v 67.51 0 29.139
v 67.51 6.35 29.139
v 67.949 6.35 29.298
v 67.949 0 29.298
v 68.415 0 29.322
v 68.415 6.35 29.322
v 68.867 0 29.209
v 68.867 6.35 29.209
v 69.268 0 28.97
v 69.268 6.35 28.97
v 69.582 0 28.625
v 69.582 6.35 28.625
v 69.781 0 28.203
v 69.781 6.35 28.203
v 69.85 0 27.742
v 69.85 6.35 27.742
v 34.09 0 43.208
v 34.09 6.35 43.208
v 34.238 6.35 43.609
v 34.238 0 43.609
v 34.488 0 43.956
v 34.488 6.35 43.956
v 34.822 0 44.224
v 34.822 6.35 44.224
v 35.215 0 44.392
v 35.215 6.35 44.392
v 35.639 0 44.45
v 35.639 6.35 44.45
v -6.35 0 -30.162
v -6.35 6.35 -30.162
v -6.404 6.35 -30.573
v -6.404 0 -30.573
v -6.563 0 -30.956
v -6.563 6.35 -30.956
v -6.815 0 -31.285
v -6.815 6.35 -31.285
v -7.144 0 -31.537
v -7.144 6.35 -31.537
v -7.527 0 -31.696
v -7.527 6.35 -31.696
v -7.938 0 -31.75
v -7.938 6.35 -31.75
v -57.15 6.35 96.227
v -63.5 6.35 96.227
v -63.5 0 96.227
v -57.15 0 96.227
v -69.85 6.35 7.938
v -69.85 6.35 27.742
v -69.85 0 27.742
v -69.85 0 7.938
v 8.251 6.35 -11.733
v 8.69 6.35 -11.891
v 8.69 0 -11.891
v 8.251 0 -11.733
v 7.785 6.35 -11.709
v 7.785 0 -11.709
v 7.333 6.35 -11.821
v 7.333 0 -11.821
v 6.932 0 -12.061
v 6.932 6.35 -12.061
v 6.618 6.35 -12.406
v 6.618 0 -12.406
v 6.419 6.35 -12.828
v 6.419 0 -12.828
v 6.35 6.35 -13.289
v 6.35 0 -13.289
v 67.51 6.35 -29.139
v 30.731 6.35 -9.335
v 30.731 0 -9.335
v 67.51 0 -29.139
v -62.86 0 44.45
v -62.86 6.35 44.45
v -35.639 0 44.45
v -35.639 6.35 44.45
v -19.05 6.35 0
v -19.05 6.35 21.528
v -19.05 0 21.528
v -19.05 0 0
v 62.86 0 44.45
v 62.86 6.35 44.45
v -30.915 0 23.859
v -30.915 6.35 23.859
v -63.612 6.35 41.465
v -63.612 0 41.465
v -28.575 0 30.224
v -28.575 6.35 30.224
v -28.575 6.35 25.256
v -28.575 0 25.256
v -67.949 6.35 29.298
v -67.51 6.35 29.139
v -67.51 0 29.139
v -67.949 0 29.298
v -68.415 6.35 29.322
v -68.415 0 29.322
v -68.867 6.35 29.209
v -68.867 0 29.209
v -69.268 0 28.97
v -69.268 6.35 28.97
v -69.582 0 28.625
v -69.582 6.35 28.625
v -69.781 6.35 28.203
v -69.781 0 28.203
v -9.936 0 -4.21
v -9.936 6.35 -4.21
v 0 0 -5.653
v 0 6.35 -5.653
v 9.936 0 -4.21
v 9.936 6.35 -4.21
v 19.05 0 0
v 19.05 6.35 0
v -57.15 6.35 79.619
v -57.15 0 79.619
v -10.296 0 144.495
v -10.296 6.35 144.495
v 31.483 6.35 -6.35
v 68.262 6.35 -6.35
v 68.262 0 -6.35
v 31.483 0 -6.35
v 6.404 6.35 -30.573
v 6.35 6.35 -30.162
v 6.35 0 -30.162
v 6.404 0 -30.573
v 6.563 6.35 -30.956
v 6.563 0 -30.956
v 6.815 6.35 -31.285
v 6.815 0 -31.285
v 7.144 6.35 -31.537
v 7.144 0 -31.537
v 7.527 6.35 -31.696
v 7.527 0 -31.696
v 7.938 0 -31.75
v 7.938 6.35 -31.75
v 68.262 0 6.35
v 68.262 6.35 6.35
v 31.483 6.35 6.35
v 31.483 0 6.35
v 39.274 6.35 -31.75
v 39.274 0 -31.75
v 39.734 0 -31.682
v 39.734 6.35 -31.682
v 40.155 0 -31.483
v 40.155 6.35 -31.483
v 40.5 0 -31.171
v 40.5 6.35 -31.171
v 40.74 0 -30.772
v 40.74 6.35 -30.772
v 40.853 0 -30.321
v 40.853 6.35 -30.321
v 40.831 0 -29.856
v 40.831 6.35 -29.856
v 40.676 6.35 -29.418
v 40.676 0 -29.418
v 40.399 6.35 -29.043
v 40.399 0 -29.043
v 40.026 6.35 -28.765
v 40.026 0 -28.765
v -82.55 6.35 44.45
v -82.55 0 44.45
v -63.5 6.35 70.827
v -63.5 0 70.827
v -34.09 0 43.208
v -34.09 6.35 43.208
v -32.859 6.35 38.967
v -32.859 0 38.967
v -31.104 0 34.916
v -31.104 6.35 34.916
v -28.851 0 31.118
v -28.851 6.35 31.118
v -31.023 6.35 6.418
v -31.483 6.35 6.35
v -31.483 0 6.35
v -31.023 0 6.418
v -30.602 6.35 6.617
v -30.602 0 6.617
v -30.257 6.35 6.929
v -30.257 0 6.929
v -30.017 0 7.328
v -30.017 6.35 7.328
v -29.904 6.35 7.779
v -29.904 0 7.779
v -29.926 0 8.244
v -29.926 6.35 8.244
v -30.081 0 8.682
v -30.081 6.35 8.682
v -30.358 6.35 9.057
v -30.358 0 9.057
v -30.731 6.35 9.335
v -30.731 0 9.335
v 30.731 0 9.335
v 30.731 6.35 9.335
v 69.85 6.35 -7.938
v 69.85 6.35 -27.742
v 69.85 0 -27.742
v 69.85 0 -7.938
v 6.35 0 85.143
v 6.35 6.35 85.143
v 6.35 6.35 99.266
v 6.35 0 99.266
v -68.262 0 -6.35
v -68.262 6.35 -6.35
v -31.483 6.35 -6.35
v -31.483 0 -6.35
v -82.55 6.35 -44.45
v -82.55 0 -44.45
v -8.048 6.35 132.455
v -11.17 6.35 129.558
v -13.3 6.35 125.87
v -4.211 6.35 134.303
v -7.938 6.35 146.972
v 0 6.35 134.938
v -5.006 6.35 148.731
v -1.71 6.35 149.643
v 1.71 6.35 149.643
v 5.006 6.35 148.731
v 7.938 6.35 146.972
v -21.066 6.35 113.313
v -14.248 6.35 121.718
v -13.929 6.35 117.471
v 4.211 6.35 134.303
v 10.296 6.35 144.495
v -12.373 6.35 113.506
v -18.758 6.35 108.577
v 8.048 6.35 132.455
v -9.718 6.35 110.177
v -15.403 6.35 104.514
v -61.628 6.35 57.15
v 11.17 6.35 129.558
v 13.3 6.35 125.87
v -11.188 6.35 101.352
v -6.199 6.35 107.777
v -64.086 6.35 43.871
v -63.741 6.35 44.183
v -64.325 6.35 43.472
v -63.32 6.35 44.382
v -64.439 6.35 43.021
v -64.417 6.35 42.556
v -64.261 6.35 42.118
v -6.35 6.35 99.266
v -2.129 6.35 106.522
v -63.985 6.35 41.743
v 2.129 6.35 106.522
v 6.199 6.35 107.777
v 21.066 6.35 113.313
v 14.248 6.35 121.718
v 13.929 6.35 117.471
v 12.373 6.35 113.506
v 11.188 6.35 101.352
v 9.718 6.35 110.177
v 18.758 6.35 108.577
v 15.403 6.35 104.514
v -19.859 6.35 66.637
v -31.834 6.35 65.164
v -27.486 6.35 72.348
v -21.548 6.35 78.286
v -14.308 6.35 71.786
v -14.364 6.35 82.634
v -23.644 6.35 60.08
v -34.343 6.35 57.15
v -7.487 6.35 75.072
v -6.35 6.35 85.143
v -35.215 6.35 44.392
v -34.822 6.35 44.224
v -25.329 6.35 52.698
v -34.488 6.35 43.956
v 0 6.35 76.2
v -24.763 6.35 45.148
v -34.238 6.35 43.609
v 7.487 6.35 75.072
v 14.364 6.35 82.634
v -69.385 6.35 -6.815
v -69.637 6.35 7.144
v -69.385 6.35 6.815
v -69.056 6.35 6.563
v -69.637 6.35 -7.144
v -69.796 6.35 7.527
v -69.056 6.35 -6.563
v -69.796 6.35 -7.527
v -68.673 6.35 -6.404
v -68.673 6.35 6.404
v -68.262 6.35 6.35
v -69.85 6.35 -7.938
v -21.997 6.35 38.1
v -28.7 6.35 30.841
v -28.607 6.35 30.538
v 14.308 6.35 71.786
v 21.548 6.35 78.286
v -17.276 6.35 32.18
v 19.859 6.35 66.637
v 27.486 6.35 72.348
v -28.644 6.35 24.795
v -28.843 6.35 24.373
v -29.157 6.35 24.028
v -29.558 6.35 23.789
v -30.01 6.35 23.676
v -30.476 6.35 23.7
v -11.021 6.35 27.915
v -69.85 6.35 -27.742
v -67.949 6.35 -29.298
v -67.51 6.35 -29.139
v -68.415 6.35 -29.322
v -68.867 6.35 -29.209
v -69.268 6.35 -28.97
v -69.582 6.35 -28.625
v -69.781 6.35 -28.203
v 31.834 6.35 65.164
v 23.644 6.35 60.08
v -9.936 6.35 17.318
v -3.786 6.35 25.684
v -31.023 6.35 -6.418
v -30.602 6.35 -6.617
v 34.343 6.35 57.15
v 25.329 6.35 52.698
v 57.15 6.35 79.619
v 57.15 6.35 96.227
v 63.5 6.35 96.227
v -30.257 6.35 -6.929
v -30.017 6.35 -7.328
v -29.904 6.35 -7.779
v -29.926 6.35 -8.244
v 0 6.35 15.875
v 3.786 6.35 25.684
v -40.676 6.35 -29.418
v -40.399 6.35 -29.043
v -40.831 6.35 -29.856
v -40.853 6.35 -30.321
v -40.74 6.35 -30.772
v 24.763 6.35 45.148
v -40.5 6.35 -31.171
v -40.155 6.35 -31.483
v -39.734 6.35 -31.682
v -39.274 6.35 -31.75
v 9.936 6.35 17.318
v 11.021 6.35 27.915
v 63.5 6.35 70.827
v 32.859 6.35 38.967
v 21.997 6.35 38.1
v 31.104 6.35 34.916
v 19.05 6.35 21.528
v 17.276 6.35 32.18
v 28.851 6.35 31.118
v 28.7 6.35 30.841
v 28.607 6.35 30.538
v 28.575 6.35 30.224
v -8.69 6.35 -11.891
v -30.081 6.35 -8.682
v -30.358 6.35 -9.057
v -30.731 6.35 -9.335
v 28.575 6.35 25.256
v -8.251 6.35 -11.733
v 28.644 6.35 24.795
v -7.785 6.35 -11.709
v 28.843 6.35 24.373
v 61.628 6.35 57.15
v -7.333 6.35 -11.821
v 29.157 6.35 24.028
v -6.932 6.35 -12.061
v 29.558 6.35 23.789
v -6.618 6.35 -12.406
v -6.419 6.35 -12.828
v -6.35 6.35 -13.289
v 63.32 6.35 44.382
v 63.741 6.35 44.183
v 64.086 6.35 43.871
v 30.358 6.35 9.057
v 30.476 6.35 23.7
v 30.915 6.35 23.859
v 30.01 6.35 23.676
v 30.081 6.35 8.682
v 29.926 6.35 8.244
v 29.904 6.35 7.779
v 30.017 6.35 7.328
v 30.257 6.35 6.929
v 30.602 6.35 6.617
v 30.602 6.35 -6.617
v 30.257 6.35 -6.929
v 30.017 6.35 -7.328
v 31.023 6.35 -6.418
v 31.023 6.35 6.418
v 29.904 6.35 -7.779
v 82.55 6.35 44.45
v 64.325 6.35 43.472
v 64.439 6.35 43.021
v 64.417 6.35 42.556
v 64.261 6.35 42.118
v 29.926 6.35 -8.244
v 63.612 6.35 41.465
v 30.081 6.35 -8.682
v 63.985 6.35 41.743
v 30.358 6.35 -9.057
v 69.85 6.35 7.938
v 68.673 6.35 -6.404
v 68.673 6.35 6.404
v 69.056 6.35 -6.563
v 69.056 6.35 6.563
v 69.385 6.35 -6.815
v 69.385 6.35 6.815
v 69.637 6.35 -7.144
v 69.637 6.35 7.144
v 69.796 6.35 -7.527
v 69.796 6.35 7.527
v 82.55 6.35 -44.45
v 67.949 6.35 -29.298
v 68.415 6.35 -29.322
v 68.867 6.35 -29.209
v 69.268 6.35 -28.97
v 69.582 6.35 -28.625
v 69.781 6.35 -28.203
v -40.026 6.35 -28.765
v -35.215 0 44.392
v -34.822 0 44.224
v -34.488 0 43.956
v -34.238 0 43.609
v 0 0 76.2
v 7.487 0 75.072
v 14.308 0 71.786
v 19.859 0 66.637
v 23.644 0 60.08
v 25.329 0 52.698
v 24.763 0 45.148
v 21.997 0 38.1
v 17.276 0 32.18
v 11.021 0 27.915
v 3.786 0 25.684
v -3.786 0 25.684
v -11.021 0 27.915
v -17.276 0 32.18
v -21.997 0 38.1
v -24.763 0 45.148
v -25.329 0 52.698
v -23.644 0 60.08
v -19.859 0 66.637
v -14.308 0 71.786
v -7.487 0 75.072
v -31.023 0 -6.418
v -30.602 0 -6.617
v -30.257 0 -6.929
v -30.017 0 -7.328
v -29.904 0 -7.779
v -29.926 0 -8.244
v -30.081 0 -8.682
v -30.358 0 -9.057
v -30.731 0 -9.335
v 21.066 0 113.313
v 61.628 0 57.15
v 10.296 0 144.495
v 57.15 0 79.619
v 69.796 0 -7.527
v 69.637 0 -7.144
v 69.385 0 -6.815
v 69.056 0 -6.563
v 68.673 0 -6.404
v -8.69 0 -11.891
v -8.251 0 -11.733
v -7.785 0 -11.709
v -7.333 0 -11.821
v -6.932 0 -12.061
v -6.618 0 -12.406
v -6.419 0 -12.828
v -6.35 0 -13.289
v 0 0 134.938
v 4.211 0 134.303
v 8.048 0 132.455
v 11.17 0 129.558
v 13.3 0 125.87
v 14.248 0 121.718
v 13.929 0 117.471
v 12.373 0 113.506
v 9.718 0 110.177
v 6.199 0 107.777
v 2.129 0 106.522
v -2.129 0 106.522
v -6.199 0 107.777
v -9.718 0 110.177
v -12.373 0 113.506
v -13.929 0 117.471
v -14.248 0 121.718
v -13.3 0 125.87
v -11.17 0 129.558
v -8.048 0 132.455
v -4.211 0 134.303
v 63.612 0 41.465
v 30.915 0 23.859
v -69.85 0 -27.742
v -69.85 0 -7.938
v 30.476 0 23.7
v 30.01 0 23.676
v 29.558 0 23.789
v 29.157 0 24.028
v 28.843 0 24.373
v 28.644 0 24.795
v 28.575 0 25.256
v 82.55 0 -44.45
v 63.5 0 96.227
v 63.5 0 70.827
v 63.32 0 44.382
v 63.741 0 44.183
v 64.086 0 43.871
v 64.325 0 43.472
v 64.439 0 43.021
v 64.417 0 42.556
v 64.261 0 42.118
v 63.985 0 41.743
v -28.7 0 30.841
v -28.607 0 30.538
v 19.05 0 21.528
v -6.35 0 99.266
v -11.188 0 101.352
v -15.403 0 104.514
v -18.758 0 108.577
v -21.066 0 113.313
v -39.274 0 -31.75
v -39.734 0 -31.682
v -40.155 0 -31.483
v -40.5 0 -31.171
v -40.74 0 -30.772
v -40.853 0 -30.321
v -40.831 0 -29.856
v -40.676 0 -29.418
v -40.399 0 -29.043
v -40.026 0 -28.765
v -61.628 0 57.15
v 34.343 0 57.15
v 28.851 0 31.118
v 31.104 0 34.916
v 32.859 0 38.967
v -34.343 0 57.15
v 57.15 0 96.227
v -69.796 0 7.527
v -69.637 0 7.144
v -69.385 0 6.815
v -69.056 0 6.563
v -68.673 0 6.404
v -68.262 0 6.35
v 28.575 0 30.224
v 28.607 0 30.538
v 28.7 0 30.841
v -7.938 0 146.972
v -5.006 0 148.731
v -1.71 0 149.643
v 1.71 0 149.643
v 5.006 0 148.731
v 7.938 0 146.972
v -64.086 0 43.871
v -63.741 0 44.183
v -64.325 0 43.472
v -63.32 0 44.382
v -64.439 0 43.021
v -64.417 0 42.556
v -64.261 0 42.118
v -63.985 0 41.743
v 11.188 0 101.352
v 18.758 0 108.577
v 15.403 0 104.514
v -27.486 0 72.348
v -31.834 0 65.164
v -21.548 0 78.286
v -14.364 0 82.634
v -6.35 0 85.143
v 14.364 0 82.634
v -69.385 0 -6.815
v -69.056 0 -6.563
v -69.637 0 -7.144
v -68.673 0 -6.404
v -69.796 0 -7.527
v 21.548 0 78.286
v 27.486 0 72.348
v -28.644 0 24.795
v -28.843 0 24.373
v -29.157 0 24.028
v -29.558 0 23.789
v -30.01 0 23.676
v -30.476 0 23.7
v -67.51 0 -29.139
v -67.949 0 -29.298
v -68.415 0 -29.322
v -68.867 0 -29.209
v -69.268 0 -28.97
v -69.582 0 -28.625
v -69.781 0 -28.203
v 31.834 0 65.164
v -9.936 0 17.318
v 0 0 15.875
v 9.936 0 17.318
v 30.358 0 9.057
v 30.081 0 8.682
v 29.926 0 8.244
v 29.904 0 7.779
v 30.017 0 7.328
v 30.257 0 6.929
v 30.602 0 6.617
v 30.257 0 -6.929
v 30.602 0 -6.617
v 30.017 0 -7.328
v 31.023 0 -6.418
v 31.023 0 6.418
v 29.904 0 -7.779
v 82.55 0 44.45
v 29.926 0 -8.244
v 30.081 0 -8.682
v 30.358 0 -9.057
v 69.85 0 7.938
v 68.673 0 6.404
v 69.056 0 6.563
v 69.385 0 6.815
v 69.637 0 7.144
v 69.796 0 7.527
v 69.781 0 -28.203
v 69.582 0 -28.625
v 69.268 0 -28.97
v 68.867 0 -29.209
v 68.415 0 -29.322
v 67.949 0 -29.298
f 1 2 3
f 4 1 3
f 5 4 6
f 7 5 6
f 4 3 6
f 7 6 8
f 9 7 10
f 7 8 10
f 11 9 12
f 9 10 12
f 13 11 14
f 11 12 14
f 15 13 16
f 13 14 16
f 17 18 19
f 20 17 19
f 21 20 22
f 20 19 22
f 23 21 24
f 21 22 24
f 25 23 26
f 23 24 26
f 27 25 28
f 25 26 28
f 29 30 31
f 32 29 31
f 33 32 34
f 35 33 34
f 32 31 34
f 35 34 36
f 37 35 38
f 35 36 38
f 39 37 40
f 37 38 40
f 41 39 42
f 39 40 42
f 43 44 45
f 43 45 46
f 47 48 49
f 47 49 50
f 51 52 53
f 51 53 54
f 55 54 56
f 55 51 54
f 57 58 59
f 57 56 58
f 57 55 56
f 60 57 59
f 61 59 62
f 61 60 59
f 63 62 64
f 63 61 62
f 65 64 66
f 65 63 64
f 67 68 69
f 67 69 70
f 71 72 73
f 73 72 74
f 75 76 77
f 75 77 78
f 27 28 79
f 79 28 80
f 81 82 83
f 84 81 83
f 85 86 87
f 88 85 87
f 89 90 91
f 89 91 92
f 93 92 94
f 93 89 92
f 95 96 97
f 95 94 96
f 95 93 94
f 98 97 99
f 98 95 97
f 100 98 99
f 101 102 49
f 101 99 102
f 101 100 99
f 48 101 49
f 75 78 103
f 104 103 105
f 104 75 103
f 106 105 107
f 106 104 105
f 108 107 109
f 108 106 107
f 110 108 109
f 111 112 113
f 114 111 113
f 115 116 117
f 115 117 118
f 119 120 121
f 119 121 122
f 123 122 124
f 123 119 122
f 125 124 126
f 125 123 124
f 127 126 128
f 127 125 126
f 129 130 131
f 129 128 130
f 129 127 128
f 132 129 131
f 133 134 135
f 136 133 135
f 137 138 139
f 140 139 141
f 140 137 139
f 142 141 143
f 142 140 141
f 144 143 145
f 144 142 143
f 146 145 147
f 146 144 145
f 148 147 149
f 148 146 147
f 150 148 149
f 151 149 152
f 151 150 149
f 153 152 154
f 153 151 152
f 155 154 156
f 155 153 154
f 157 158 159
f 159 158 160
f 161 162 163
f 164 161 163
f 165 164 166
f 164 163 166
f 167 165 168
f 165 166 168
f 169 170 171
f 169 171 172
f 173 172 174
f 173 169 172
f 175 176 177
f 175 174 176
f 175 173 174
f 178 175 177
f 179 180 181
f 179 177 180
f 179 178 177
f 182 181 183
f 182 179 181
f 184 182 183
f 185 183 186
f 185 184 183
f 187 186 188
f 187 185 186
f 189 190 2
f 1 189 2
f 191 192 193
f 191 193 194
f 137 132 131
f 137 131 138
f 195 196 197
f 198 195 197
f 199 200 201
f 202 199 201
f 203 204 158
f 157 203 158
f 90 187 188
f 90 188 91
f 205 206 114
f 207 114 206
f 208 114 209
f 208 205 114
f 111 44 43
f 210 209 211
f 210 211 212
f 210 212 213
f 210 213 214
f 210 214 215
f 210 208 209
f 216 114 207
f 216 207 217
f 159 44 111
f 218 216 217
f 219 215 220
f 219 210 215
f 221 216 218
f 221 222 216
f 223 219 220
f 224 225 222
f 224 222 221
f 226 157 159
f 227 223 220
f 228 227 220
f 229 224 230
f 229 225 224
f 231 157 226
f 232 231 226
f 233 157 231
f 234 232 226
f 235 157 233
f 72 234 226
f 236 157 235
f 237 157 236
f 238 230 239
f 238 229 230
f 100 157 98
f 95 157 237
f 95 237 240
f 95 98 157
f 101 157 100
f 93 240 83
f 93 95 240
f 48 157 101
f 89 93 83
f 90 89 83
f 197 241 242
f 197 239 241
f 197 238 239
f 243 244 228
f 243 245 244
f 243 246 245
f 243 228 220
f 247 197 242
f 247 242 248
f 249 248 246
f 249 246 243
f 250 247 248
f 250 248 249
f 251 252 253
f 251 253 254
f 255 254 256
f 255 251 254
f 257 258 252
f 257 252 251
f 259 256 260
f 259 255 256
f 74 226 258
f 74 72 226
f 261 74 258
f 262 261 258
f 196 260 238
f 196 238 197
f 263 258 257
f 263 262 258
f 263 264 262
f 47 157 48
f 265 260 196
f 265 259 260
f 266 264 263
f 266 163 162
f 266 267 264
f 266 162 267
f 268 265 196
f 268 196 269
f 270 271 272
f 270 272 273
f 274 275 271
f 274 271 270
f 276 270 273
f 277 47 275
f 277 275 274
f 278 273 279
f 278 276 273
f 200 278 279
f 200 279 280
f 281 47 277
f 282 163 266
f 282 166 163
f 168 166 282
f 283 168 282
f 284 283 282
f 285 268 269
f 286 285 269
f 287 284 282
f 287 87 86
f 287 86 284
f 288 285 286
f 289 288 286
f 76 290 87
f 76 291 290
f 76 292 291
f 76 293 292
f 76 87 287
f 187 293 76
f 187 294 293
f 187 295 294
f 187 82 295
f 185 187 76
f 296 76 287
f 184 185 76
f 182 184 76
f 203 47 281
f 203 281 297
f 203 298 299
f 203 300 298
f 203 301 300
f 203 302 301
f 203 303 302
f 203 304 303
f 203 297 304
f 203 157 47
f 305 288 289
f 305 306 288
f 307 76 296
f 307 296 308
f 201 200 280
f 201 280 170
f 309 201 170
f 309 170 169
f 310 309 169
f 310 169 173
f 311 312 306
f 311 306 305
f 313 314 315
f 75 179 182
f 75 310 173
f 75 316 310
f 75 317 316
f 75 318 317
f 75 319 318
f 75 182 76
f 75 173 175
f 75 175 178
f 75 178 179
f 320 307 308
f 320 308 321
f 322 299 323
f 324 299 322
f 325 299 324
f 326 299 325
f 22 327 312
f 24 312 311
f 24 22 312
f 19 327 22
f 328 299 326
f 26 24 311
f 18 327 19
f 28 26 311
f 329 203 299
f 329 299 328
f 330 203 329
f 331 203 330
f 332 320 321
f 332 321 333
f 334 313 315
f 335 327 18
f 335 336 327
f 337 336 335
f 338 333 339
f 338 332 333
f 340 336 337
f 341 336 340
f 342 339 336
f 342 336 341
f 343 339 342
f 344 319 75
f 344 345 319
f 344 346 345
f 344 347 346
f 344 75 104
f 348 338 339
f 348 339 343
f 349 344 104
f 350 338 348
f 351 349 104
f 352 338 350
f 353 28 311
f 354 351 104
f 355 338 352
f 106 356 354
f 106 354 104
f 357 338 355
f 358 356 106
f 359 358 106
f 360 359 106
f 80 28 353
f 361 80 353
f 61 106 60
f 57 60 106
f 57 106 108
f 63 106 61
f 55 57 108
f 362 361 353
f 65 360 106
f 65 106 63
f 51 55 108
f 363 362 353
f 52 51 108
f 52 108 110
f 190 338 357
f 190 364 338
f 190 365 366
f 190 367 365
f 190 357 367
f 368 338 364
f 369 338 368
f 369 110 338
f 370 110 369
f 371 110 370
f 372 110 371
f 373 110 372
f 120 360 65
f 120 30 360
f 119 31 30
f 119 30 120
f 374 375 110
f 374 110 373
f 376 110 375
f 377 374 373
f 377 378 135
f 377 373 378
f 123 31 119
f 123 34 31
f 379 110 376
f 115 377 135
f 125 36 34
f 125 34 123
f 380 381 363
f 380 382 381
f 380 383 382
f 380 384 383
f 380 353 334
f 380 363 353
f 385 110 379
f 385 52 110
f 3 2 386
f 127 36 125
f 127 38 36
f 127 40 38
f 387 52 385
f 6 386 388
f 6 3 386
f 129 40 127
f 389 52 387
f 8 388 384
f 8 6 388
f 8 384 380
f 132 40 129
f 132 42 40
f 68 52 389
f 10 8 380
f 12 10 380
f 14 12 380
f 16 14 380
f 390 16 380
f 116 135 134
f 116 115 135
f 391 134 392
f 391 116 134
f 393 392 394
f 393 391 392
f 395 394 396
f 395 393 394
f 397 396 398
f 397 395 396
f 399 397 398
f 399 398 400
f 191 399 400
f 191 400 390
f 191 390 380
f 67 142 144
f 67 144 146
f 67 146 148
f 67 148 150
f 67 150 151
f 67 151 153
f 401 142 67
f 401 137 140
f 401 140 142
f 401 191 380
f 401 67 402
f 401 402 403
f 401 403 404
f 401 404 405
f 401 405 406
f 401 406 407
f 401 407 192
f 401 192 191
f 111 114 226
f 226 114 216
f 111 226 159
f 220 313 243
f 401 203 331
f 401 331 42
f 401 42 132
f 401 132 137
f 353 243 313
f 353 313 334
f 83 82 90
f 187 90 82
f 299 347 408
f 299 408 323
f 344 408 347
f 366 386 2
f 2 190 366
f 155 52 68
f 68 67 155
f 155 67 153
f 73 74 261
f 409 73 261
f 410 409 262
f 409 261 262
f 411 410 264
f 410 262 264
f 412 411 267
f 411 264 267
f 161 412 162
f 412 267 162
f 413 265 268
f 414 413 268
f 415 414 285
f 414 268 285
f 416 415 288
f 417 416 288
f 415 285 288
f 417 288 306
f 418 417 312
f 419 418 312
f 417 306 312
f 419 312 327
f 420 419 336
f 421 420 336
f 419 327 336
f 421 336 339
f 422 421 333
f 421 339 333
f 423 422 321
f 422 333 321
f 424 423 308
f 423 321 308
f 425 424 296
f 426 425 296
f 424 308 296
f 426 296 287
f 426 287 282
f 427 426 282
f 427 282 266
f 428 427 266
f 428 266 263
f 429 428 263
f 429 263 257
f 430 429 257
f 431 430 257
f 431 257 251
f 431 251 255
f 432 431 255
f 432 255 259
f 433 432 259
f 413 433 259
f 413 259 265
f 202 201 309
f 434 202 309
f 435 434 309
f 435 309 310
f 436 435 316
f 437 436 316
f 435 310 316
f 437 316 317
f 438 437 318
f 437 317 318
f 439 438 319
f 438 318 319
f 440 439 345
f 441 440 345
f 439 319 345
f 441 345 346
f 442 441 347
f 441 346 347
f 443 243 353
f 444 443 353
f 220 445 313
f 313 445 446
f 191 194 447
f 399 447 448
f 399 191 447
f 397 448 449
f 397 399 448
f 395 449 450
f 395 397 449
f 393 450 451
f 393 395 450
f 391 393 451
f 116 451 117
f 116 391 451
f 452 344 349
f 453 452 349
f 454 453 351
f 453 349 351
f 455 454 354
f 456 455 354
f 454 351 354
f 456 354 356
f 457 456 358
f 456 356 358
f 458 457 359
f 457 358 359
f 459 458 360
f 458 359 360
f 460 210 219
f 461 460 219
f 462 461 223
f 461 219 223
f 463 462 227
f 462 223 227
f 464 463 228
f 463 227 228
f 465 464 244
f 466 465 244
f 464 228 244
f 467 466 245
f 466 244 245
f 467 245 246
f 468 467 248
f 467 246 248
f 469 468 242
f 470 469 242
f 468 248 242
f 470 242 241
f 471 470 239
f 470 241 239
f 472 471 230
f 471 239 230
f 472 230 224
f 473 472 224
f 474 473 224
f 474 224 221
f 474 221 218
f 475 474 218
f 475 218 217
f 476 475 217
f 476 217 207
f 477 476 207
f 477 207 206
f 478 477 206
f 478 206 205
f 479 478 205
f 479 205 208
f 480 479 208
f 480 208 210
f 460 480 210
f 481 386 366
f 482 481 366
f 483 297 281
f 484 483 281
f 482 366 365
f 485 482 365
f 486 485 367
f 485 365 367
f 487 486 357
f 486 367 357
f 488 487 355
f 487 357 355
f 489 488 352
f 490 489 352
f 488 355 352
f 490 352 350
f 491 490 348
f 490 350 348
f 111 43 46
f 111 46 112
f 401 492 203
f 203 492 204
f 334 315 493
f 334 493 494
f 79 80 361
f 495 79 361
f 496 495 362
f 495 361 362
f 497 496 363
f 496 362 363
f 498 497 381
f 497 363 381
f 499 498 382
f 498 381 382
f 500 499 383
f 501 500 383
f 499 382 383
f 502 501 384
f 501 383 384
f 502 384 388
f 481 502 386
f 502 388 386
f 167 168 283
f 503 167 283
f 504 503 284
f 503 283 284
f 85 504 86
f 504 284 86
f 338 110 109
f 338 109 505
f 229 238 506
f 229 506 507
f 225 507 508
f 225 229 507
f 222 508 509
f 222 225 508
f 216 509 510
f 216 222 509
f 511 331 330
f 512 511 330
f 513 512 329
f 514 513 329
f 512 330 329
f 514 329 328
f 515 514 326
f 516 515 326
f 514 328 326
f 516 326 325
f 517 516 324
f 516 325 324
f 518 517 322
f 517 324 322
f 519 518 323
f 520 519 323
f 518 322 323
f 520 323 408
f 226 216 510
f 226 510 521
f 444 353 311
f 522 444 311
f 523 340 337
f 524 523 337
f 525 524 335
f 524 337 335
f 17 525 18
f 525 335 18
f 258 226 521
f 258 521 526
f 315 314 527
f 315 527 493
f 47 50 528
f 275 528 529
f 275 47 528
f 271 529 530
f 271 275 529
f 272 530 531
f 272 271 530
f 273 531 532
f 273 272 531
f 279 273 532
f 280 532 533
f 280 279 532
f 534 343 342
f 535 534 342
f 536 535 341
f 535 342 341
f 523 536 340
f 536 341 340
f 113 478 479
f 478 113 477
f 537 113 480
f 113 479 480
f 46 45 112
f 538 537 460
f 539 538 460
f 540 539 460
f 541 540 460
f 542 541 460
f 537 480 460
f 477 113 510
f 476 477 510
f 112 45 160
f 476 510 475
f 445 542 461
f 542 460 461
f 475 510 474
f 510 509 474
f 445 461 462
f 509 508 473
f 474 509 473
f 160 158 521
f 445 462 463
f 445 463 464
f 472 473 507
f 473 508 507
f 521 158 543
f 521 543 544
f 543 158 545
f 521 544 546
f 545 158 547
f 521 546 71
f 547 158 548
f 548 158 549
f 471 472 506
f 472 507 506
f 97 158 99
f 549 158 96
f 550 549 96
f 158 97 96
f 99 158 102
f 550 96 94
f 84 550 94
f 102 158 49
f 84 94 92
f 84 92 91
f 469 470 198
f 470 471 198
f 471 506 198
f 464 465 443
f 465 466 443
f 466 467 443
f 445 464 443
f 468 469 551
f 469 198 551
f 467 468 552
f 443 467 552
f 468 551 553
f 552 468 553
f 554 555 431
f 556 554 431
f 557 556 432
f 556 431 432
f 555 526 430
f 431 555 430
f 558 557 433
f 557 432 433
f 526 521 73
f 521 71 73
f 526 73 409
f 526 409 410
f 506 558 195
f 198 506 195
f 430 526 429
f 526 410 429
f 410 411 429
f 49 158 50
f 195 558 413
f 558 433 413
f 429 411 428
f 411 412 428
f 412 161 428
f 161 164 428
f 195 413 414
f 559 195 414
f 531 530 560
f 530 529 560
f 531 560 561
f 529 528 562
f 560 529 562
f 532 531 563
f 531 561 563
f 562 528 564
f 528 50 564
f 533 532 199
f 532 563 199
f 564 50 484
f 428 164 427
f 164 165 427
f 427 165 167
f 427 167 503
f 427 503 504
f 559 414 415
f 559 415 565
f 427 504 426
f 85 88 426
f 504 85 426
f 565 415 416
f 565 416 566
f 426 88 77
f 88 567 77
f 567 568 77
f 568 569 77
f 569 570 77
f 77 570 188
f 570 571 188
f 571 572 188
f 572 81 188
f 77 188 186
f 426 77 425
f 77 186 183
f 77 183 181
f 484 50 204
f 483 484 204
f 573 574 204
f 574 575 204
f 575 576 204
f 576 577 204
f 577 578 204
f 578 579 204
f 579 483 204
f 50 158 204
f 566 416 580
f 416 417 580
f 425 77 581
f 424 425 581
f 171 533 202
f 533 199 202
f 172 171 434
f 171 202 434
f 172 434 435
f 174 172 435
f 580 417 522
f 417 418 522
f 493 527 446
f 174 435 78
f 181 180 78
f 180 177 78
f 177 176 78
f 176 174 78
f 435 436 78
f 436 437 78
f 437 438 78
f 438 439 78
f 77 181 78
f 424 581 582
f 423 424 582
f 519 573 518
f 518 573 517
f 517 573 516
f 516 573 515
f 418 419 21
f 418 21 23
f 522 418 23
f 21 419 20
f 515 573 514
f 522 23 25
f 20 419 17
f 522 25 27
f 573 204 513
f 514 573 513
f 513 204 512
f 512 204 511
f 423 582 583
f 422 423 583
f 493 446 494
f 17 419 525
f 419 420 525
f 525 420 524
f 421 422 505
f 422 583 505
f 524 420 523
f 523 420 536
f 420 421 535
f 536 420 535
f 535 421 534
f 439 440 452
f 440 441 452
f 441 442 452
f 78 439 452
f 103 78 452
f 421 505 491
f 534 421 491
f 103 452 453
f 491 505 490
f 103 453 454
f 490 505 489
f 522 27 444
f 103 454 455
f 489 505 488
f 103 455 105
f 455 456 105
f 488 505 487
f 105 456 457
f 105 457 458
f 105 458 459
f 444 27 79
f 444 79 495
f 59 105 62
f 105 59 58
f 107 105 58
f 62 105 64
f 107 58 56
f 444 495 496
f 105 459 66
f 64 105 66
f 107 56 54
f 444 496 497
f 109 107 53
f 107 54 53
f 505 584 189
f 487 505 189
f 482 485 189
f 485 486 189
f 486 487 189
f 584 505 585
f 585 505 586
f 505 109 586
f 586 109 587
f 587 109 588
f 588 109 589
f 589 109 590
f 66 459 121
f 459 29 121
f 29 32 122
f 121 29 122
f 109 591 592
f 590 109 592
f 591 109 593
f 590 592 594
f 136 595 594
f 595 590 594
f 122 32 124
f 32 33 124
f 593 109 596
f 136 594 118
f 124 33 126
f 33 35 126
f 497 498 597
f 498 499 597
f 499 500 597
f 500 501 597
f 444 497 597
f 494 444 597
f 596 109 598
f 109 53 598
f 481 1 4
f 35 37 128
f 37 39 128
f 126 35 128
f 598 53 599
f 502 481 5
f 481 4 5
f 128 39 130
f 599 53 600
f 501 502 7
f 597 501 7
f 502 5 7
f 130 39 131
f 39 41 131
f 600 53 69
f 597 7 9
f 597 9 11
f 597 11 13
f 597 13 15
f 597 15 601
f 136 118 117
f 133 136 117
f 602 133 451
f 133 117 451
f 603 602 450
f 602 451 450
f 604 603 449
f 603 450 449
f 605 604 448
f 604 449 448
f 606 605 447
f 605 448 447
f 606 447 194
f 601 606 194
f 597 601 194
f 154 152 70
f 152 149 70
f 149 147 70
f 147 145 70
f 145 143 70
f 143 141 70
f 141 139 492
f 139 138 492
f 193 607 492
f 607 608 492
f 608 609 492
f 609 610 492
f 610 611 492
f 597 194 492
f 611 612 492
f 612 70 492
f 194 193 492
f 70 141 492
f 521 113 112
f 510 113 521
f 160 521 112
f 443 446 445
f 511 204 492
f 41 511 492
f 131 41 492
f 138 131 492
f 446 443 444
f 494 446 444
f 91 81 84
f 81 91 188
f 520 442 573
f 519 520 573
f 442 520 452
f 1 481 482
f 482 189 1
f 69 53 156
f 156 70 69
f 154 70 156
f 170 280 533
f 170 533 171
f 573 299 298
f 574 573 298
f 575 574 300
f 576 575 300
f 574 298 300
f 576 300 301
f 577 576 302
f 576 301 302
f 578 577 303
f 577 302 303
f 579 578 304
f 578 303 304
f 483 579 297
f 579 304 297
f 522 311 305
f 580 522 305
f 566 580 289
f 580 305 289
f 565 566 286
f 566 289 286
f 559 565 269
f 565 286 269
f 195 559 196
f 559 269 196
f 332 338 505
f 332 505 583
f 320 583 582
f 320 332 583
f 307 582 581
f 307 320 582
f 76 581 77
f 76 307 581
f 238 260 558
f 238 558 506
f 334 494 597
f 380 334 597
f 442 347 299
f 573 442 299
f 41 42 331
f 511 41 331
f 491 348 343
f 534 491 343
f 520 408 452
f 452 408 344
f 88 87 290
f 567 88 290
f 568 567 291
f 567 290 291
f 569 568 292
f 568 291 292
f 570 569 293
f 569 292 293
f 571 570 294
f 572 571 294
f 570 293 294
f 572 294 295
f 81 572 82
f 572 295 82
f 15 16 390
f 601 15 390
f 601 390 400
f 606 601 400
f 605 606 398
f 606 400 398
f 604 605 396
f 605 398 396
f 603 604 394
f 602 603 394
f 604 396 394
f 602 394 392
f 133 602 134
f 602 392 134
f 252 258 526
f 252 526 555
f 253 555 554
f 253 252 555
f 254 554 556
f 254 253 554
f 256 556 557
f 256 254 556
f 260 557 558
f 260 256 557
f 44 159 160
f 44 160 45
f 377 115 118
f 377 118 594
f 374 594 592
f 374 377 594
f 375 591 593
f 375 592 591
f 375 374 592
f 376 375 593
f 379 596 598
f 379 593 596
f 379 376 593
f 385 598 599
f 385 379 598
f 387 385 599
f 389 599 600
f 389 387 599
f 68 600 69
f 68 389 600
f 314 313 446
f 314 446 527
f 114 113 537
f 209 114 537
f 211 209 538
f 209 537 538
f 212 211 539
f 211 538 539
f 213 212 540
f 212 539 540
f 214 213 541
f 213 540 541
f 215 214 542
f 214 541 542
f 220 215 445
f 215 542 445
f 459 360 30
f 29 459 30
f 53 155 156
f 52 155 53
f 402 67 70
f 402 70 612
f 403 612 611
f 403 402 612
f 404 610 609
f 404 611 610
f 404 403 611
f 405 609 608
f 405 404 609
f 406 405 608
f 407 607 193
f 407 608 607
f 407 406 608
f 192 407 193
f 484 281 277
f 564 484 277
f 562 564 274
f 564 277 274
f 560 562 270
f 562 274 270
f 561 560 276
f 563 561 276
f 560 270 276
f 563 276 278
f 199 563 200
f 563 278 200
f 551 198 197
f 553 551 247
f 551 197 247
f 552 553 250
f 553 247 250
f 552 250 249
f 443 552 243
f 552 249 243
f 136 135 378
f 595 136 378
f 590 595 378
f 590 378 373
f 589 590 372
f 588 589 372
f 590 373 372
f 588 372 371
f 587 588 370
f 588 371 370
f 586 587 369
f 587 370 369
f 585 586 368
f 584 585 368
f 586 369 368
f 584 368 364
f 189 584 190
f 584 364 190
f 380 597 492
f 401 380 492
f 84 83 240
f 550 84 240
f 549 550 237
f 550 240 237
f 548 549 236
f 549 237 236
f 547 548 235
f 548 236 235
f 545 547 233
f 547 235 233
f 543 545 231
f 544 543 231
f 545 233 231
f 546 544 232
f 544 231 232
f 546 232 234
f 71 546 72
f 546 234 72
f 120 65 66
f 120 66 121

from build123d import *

# Parameters (mm, degrees)
BOSS_EXTRUDE1_DEPTH = 6.35
BOSS_EXTRUDE2_DEPTH = 6.35
CUT_EXTRUDE2_REACH  = 173.121
SKETCH3_R           = 25.4
SKETCH3_R_2         = 14.2875


with BuildPart() as part:
    # Sketch1 → Boss-Extrude1 (new body)
    with BuildSketch(Plane(origin=(0, 0, 0), x_dir=(1, 0, 0), z_dir=(0, 1, 0))):
        with BuildLine():
            Line((-82.55, -44.45), (-10.295626201, -144.494517568))
            ThreePointArc((-10.295626201, -144.494517568), (0, -149.758787534), (10.295626201, -144.494517568))
            Line((10.295626201, -144.494517568), (82.55, -44.45))
            Line((82.55, -44.45), (82.55, 44.45))
            Line((82.55, 44.45), (-82.55, 44.45))
            Line((-82.55, 44.45), (-82.55, -44.45))
        make_face()
    extrude(amount=BOSS_EXTRUDE1_DEPTH)

    # Sketch4 → Boss-Extrude2 (add)
    with BuildSketch(Plane(origin=(0, 6.35, 0), x_dir=(1, 0, 0), z_dir=(0, 1, 0))):
        Polygon((-63.5, -70.826923077), (-63.5, -96.226923077), (-57.15, -96.226923077), (-57.15, -79.619230769), align=None)
        Polygon((57.15, -96.226923077), (63.5, -96.226923077), (63.5, -70.826923077), (57.15, -79.619230769), align=None)
    extrude(amount=-BOSS_EXTRUDE2_DEPTH)

    # Sketch3 → Cut-Extrude2 (cut, up to next)
    with BuildSketch(Plane(origin=(0, 6.35, 0), x_dir=(1, 0, 0), z_dir=(0, 1, 0)), mode=Mode.PRIVATE) as cut_extrude2_sk1:
        with Locations(Location((0, -50.8, 0), (0, 0, 270))):
            Circle(SKETCH3_R)
    cut_extrude2_tool1 = extrude(cut_extrude2_sk1.sketch, amount=-CUT_EXTRUDE2_REACH, mode=Mode.PRIVATE) & part.part
    # Sketch3 → Cut-Extrude2 (cut, up to next)
    with BuildSketch(Plane(origin=(0, 6.35, 0), x_dir=(1, 0, 0), z_dir=(0, 1, 0)), mode=Mode.PRIVATE) as cut_extrude2_sk2:
        with Locations(Location((0, -120.65, 0), (0, 0, 270))):
            Circle(SKETCH3_R_2)
    cut_extrude2_tool2 = extrude(cut_extrude2_sk2.sketch, amount=-CUT_EXTRUDE2_REACH, mode=Mode.PRIVATE) & part.part
    # Sketch3 → Cut-Extrude2 (cut, up to next)
    with BuildSketch(Plane(origin=(0, 6.35, 0), x_dir=(1, 0, 0), z_dir=(0, 1, 0)), mode=Mode.PRIVATE) as cut_extrude2_sk3:
        with BuildLine():
            Line((-40.026450178, 28.764752129), (-8.690133469, 11.891350824))
            ThreePointArc((-8.690133469, 11.891350824), (-7.123451286, 11.92620437), (-6.35, 13.289098695))
            Line((-6.35, 13.289098695), (-6.35, 30.1625))
            ThreePointArc((-6.35, 30.1625), (-6.814967985, 31.285032015), (-7.9375, 31.75))
            Line((-7.9375, 31.75), (-39.273816708, 31.75))
            ThreePointArc((-39.273816708, 31.75), (-40.813147894, 30.550592453), (-40.026450178, 28.764752129))
        make_face()
    cut_extrude2_tool3 = extrude(cut_extrude2_sk3.sketch, amount=-CUT_EXTRUDE2_REACH, mode=Mode.PRIVATE) & part.part
    # Sketch3 → Cut-Extrude2 (cut, up to next)
    with BuildSketch(Plane(origin=(0, 6.35, 0), x_dir=(1, 0, 0), z_dir=(0, 1, 0)), mode=Mode.PRIVATE) as cut_extrude2_sk4:
        with BuildLine():
            Line((-69.85, 27.741670535), (-69.85, 7.9375))
            ThreePointArc((-69.85, 7.9375), (-69.385032015, 6.814967985), (-68.2625, 6.35))
            Line((-68.2625, 6.35), (-31.483326149, 6.35))
            ThreePointArc((-31.483326149, 6.35), (-29.943994963, 7.549407547), (-30.73069268, 9.335247871))
            Line((-30.73069268, 9.335247871), (-67.509866531, 29.139418406))
            ThreePointArc((-67.509866531, 29.139418406), (-69.076548714, 29.10456486), (-69.85, 27.741670535))
        make_face()
    cut_extrude2_tool4 = extrude(cut_extrude2_sk4.sketch, amount=-CUT_EXTRUDE2_REACH, mode=Mode.PRIVATE) & part.part
    # Sketch3 → Cut-Extrude2 (cut, up to next)
    with BuildSketch(Plane(origin=(0, 6.35, 0), x_dir=(1, 0, 0), z_dir=(0, 1, 0)), mode=Mode.PRIVATE) as cut_extrude2_sk5:
        with BuildLine():
            Line((7.9375, 31.75), (39.273816708, 31.75))
            ThreePointArc((39.273816708, 31.75), (40.813147894, 30.550592453), (40.026450178, 28.764752129))
            Line((40.026450178, 28.764752129), (8.690133469, 11.891350824))
            ThreePointArc((8.690133469, 11.891350824), (7.123451286, 11.92620437), (6.35, 13.289098695))
            Line((6.35, 13.289098695), (6.35, 30.1625))
            ThreePointArc((6.35, 30.1625), (6.814967985, 31.285032015), (7.9375, 31.75))
        make_face()
    cut_extrude2_tool5 = extrude(cut_extrude2_sk5.sketch, amount=-CUT_EXTRUDE2_REACH, mode=Mode.PRIVATE) & part.part
    # Sketch3 → Cut-Extrude2 (cut, up to next)
    with BuildSketch(Plane(origin=(0, 6.35, 0), x_dir=(1, 0, 0), z_dir=(0, 1, 0)), mode=Mode.PRIVATE) as cut_extrude2_sk6:
        with BuildLine():
            Line((30.73069268, 9.335247871), (67.509866531, 29.139418406))
            ThreePointArc((67.509866531, 29.139418406), (69.076548714, 29.10456486), (69.85, 27.741670535))
            Line((69.85, 27.741670535), (69.85, 7.9375))
            ThreePointArc((69.85, 7.9375), (69.385032015, 6.814967985), (68.2625, 6.35))
            Line((68.2625, 6.35), (31.483326149, 6.35))
            ThreePointArc((31.483326149, 6.35), (29.943994963, 7.549407547), (30.73069268, 9.335247871))
        make_face()
    cut_extrude2_tool6 = extrude(cut_extrude2_sk6.sketch, amount=-CUT_EXTRUDE2_REACH, mode=Mode.PRIVATE) & part.part
    # Sketch3 → Cut-Extrude2 (cut, up to next)
    with BuildSketch(Plane(origin=(0, 6.35, 0), x_dir=(1, 0, 0), z_dir=(0, 1, 0)), mode=Mode.PRIVATE) as cut_extrude2_sk7:
        with BuildLine():
            Line((69.85, -27.741670535), (69.85, -7.9375))
            ThreePointArc((69.85, -7.9375), (69.385032015, -6.814967985), (68.2625, -6.35))
            Line((68.2625, -6.35), (31.483326149, -6.35))
            ThreePointArc((31.483326149, -6.35), (29.943994963, -7.549407547), (30.73069268, -9.335247871))
            Line((30.73069268, -9.335247871), (67.509866531, -29.139418406))
            ThreePointArc((67.509866531, -29.139418406), (69.076548714, -29.10456486), (69.85, -27.741670535))
        make_face()
    cut_extrude2_tool7 = extrude(cut_extrude2_sk7.sketch, amount=-CUT_EXTRUDE2_REACH, mode=Mode.PRIVATE) & part.part
    # Sketch3 → Cut-Extrude2 (cut, up to next)
    with BuildSketch(Plane(origin=(0, 6.35, 0), x_dir=(1, 0, 0), z_dir=(0, 1, 0)), mode=Mode.PRIVATE) as cut_extrude2_sk8:
        with BuildLine():
            Line((-30.73069268, -9.335247871), (-67.509866531, -29.139418406))
            ThreePointArc((-67.509866531, -29.139418406), (-69.076548714, -29.10456486), (-69.85, -27.741670535))
            Line((-69.85, -27.741670535), (-69.85, -7.9375))
            ThreePointArc((-69.85, -7.9375), (-69.385032015, -6.814967985), (-68.2625, -6.35))
            Line((-68.2625, -6.35), (-31.483326149, -6.35))
            ThreePointArc((-31.483326149, -6.35), (-29.943994963, -7.549407547), (-30.73069268, -9.335247871))
        make_face()
    cut_extrude2_tool8 = extrude(cut_extrude2_sk8.sketch, amount=-CUT_EXTRUDE2_REACH, mode=Mode.PRIVATE) & part.part
    # Sketch3 → Cut-Extrude2 (cut, up to next)
    with BuildSketch(Plane(origin=(0, 6.35, 0), x_dir=(1, 0, 0), z_dir=(0, 1, 0)), mode=Mode.PRIVATE) as cut_extrude2_sk9:
        with BuildLine():
            Line((-6.35, -85.142875899), (-6.35, -99.265701316))
            ThreePointArc((-6.35, -99.265701316), (-15.402705776, -104.514096399), (-21.066111407, -113.313128703))
            Line((-21.066111407, -113.313128703), (-61.628371026, -57.15))
            Line((-61.628371026, -57.15), (-34.342875899, -57.15))
            ThreePointArc((-34.342875899, -57.15), (-24.695704333, -75.495704333), (-6.35, -85.142875899))
        make_face()
    cut_extrude2_tool9 = extrude(cut_extrude2_sk9.sketch, amount=-CUT_EXTRUDE2_REACH, mode=Mode.PRIVATE) & part.part
    # Sketch3 → Cut-Extrude2 (cut, up to next)
    with BuildSketch(Plane(origin=(0, 6.35, 0), x_dir=(1, 0, 0), z_dir=(0, 1, 0)), mode=Mode.PRIVATE) as cut_extrude2_sk10:
        with BuildLine():
            Line((6.35, -85.142875899), (6.35, -99.265701316))
            ThreePointArc((6.35, -99.265701316), (15.402705776, -104.514096399), (21.066111407, -113.313128703))
            Line((21.066111407, -113.313128703), (61.628371026, -57.15))
            Line((61.628371026, -57.15), (34.342875899, -57.15))
            ThreePointArc((34.342875899, -57.15), (24.695704333, -75.495704333), (6.35, -85.142875899))
        make_face()
    cut_extrude2_tool10 = extrude(cut_extrude2_sk10.sketch, amount=-CUT_EXTRUDE2_REACH, mode=Mode.PRIVATE) & part.part
    # Sketch3 → Cut-Extrude2 (cut, up to next)
    with BuildSketch(Plane(origin=(0, 6.35, 0), x_dir=(1, 0, 0), z_dir=(0, 1, 0)), mode=Mode.PRIVATE) as cut_extrude2_sk11:
        with BuildLine():
            Line((-19.05, -21.527946348), (-19.05, 0))
            ThreePointArc((-19.05, 0), (0, 5.652946348), (19.05, 0))
            Line((19.05, 0), (19.05, -21.527946348))
            ThreePointArc((19.05, -21.527946348), (0, -15.875), (-19.05, -21.527946348))
        make_face()
    cut_extrude2_tool11 = extrude(cut_extrude2_sk11.sketch, amount=-CUT_EXTRUDE2_REACH, mode=Mode.PRIVATE) & part.part
    # Sketch3 → Cut-Extrude2 (cut, up to next)
    with BuildSketch(Plane(origin=(0, 6.35, 0), x_dir=(1, 0, 0), z_dir=(0, 1, 0)), mode=Mode.PRIVATE) as cut_extrude2_sk12:
        with BuildLine():
            Line((-62.859530994, -44.45), (-35.639286609, -44.45))
            ThreePointArc((-35.639286609, -44.45), (-34.646236712, -44.101050827), (-34.089752409, -43.207608696))
            ThreePointArc((-34.089752409, -43.207608696), (-32.045675665, -36.913665127), (-28.851086957, -31.11827227))
            ThreePointArc((-28.851086957, -31.11827227), (-28.645591226, -30.691776493), (-28.575, -30.223648283))
            Line((-28.575, -30.223648283), (-28.575, -25.256406388))
            ThreePointArc((-28.575, -25.256406388), (-29.348451286, -23.893512063), (-30.915133469, -23.858658517))
            Line((-30.915133469, -23.858658517), (-63.612164463, -41.464752129))
            ThreePointArc((-63.612164463, -41.464752129), (-64.398862179, -43.250592453), (-62.859530994, -44.45))
        make_face()
    cut_extrude2_tool12 = extrude(cut_extrude2_sk12.sketch, amount=-CUT_EXTRUDE2_REACH, mode=Mode.PRIVATE) & part.part
    # Sketch3 → Cut-Extrude2 (cut, up to next)
    with BuildSketch(Plane(origin=(0, 6.35, 0), x_dir=(1, 0, 0), z_dir=(0, 1, 0)), mode=Mode.PRIVATE) as cut_extrude2_sk13:
        with BuildLine():
            Line((28.575, -25.256406388), (28.575, -30.223648283))
            ThreePointArc((28.575, -30.223648283), (28.645591226, -30.691776493), (28.851086957, -31.11827227))
            ThreePointArc((28.851086957, -31.11827227), (32.045675665, -36.913665127), (34.089752409, -43.207608696))
            ThreePointArc((34.089752409, -43.207608696), (34.646236712, -44.101050827), (35.639286609, -44.45))
            Line((35.639286609, -44.45), (62.859530994, -44.45))
            ThreePointArc((62.859530994, -44.45), (64.398862179, -43.250592453), (63.612164463, -41.464752129))
            Line((63.612164463, -41.464752129), (30.915133469, -23.858658517))
            ThreePointArc((30.915133469, -23.858658517), (29.348451286, -23.893512063), (28.575, -25.256406388))
        make_face()
    cut_extrude2_tool13 = extrude(cut_extrude2_sk13.sketch, amount=-CUT_EXTRUDE2_REACH, mode=Mode.PRIVATE) & part.part
    add(cut_extrude2_tool1.solids().sort_by_distance((0, 6.35, 50.8))[0], mode=Mode.SUBTRACT)
    add(cut_extrude2_tool2.solids().sort_by_distance((0, 6.35, 120.65))[0], mode=Mode.SUBTRACT)
    add(cut_extrude2_tool3.solids().sort_by_distance((-19.115543, 6.35, -24.652033))[0], mode=Mode.SUBTRACT)
    add(cut_extrude2_tool4.solids().sort_by_distance((-55.236845, 6.35, -14.418636))[0], mode=Mode.SUBTRACT)
    add(cut_extrude2_tool5.solids().sort_by_distance((19.115543, 6.35, -24.652033))[0], mode=Mode.SUBTRACT)
    add(cut_extrude2_tool6.solids().sort_by_distance((55.236845, 6.35, -14.418636))[0], mode=Mode.SUBTRACT)
    add(cut_extrude2_tool7.solids().sort_by_distance((55.236845, 6.35, 14.418636))[0], mode=Mode.SUBTRACT)
    add(cut_extrude2_tool8.solids().sort_by_distance((-55.236845, 6.35, 14.418636))[0], mode=Mode.SUBTRACT)
    add(cut_extrude2_tool9.solids().sort_by_distance((-30.896348, 6.35, 81.78683))[0], mode=Mode.SUBTRACT)
    add(cut_extrude2_tool10.solids().sort_by_distance((30.896348, 6.35, 81.78683))[0], mode=Mode.SUBTRACT)
    add(cut_extrude2_tool11.solids().sort_by_distance((0, 6.35, 6.929783))[0], mode=Mode.SUBTRACT)
    add(cut_extrude2_tool12.solids().sort_by_distance((-43.155831, 6.35, 36.82378))[0], mode=Mode.SUBTRACT)
    add(cut_extrude2_tool13.solids().sort_by_distance((43.155831, 6.35, 36.82378))[0], mode=Mode.SUBTRACT)


solid = part.part
